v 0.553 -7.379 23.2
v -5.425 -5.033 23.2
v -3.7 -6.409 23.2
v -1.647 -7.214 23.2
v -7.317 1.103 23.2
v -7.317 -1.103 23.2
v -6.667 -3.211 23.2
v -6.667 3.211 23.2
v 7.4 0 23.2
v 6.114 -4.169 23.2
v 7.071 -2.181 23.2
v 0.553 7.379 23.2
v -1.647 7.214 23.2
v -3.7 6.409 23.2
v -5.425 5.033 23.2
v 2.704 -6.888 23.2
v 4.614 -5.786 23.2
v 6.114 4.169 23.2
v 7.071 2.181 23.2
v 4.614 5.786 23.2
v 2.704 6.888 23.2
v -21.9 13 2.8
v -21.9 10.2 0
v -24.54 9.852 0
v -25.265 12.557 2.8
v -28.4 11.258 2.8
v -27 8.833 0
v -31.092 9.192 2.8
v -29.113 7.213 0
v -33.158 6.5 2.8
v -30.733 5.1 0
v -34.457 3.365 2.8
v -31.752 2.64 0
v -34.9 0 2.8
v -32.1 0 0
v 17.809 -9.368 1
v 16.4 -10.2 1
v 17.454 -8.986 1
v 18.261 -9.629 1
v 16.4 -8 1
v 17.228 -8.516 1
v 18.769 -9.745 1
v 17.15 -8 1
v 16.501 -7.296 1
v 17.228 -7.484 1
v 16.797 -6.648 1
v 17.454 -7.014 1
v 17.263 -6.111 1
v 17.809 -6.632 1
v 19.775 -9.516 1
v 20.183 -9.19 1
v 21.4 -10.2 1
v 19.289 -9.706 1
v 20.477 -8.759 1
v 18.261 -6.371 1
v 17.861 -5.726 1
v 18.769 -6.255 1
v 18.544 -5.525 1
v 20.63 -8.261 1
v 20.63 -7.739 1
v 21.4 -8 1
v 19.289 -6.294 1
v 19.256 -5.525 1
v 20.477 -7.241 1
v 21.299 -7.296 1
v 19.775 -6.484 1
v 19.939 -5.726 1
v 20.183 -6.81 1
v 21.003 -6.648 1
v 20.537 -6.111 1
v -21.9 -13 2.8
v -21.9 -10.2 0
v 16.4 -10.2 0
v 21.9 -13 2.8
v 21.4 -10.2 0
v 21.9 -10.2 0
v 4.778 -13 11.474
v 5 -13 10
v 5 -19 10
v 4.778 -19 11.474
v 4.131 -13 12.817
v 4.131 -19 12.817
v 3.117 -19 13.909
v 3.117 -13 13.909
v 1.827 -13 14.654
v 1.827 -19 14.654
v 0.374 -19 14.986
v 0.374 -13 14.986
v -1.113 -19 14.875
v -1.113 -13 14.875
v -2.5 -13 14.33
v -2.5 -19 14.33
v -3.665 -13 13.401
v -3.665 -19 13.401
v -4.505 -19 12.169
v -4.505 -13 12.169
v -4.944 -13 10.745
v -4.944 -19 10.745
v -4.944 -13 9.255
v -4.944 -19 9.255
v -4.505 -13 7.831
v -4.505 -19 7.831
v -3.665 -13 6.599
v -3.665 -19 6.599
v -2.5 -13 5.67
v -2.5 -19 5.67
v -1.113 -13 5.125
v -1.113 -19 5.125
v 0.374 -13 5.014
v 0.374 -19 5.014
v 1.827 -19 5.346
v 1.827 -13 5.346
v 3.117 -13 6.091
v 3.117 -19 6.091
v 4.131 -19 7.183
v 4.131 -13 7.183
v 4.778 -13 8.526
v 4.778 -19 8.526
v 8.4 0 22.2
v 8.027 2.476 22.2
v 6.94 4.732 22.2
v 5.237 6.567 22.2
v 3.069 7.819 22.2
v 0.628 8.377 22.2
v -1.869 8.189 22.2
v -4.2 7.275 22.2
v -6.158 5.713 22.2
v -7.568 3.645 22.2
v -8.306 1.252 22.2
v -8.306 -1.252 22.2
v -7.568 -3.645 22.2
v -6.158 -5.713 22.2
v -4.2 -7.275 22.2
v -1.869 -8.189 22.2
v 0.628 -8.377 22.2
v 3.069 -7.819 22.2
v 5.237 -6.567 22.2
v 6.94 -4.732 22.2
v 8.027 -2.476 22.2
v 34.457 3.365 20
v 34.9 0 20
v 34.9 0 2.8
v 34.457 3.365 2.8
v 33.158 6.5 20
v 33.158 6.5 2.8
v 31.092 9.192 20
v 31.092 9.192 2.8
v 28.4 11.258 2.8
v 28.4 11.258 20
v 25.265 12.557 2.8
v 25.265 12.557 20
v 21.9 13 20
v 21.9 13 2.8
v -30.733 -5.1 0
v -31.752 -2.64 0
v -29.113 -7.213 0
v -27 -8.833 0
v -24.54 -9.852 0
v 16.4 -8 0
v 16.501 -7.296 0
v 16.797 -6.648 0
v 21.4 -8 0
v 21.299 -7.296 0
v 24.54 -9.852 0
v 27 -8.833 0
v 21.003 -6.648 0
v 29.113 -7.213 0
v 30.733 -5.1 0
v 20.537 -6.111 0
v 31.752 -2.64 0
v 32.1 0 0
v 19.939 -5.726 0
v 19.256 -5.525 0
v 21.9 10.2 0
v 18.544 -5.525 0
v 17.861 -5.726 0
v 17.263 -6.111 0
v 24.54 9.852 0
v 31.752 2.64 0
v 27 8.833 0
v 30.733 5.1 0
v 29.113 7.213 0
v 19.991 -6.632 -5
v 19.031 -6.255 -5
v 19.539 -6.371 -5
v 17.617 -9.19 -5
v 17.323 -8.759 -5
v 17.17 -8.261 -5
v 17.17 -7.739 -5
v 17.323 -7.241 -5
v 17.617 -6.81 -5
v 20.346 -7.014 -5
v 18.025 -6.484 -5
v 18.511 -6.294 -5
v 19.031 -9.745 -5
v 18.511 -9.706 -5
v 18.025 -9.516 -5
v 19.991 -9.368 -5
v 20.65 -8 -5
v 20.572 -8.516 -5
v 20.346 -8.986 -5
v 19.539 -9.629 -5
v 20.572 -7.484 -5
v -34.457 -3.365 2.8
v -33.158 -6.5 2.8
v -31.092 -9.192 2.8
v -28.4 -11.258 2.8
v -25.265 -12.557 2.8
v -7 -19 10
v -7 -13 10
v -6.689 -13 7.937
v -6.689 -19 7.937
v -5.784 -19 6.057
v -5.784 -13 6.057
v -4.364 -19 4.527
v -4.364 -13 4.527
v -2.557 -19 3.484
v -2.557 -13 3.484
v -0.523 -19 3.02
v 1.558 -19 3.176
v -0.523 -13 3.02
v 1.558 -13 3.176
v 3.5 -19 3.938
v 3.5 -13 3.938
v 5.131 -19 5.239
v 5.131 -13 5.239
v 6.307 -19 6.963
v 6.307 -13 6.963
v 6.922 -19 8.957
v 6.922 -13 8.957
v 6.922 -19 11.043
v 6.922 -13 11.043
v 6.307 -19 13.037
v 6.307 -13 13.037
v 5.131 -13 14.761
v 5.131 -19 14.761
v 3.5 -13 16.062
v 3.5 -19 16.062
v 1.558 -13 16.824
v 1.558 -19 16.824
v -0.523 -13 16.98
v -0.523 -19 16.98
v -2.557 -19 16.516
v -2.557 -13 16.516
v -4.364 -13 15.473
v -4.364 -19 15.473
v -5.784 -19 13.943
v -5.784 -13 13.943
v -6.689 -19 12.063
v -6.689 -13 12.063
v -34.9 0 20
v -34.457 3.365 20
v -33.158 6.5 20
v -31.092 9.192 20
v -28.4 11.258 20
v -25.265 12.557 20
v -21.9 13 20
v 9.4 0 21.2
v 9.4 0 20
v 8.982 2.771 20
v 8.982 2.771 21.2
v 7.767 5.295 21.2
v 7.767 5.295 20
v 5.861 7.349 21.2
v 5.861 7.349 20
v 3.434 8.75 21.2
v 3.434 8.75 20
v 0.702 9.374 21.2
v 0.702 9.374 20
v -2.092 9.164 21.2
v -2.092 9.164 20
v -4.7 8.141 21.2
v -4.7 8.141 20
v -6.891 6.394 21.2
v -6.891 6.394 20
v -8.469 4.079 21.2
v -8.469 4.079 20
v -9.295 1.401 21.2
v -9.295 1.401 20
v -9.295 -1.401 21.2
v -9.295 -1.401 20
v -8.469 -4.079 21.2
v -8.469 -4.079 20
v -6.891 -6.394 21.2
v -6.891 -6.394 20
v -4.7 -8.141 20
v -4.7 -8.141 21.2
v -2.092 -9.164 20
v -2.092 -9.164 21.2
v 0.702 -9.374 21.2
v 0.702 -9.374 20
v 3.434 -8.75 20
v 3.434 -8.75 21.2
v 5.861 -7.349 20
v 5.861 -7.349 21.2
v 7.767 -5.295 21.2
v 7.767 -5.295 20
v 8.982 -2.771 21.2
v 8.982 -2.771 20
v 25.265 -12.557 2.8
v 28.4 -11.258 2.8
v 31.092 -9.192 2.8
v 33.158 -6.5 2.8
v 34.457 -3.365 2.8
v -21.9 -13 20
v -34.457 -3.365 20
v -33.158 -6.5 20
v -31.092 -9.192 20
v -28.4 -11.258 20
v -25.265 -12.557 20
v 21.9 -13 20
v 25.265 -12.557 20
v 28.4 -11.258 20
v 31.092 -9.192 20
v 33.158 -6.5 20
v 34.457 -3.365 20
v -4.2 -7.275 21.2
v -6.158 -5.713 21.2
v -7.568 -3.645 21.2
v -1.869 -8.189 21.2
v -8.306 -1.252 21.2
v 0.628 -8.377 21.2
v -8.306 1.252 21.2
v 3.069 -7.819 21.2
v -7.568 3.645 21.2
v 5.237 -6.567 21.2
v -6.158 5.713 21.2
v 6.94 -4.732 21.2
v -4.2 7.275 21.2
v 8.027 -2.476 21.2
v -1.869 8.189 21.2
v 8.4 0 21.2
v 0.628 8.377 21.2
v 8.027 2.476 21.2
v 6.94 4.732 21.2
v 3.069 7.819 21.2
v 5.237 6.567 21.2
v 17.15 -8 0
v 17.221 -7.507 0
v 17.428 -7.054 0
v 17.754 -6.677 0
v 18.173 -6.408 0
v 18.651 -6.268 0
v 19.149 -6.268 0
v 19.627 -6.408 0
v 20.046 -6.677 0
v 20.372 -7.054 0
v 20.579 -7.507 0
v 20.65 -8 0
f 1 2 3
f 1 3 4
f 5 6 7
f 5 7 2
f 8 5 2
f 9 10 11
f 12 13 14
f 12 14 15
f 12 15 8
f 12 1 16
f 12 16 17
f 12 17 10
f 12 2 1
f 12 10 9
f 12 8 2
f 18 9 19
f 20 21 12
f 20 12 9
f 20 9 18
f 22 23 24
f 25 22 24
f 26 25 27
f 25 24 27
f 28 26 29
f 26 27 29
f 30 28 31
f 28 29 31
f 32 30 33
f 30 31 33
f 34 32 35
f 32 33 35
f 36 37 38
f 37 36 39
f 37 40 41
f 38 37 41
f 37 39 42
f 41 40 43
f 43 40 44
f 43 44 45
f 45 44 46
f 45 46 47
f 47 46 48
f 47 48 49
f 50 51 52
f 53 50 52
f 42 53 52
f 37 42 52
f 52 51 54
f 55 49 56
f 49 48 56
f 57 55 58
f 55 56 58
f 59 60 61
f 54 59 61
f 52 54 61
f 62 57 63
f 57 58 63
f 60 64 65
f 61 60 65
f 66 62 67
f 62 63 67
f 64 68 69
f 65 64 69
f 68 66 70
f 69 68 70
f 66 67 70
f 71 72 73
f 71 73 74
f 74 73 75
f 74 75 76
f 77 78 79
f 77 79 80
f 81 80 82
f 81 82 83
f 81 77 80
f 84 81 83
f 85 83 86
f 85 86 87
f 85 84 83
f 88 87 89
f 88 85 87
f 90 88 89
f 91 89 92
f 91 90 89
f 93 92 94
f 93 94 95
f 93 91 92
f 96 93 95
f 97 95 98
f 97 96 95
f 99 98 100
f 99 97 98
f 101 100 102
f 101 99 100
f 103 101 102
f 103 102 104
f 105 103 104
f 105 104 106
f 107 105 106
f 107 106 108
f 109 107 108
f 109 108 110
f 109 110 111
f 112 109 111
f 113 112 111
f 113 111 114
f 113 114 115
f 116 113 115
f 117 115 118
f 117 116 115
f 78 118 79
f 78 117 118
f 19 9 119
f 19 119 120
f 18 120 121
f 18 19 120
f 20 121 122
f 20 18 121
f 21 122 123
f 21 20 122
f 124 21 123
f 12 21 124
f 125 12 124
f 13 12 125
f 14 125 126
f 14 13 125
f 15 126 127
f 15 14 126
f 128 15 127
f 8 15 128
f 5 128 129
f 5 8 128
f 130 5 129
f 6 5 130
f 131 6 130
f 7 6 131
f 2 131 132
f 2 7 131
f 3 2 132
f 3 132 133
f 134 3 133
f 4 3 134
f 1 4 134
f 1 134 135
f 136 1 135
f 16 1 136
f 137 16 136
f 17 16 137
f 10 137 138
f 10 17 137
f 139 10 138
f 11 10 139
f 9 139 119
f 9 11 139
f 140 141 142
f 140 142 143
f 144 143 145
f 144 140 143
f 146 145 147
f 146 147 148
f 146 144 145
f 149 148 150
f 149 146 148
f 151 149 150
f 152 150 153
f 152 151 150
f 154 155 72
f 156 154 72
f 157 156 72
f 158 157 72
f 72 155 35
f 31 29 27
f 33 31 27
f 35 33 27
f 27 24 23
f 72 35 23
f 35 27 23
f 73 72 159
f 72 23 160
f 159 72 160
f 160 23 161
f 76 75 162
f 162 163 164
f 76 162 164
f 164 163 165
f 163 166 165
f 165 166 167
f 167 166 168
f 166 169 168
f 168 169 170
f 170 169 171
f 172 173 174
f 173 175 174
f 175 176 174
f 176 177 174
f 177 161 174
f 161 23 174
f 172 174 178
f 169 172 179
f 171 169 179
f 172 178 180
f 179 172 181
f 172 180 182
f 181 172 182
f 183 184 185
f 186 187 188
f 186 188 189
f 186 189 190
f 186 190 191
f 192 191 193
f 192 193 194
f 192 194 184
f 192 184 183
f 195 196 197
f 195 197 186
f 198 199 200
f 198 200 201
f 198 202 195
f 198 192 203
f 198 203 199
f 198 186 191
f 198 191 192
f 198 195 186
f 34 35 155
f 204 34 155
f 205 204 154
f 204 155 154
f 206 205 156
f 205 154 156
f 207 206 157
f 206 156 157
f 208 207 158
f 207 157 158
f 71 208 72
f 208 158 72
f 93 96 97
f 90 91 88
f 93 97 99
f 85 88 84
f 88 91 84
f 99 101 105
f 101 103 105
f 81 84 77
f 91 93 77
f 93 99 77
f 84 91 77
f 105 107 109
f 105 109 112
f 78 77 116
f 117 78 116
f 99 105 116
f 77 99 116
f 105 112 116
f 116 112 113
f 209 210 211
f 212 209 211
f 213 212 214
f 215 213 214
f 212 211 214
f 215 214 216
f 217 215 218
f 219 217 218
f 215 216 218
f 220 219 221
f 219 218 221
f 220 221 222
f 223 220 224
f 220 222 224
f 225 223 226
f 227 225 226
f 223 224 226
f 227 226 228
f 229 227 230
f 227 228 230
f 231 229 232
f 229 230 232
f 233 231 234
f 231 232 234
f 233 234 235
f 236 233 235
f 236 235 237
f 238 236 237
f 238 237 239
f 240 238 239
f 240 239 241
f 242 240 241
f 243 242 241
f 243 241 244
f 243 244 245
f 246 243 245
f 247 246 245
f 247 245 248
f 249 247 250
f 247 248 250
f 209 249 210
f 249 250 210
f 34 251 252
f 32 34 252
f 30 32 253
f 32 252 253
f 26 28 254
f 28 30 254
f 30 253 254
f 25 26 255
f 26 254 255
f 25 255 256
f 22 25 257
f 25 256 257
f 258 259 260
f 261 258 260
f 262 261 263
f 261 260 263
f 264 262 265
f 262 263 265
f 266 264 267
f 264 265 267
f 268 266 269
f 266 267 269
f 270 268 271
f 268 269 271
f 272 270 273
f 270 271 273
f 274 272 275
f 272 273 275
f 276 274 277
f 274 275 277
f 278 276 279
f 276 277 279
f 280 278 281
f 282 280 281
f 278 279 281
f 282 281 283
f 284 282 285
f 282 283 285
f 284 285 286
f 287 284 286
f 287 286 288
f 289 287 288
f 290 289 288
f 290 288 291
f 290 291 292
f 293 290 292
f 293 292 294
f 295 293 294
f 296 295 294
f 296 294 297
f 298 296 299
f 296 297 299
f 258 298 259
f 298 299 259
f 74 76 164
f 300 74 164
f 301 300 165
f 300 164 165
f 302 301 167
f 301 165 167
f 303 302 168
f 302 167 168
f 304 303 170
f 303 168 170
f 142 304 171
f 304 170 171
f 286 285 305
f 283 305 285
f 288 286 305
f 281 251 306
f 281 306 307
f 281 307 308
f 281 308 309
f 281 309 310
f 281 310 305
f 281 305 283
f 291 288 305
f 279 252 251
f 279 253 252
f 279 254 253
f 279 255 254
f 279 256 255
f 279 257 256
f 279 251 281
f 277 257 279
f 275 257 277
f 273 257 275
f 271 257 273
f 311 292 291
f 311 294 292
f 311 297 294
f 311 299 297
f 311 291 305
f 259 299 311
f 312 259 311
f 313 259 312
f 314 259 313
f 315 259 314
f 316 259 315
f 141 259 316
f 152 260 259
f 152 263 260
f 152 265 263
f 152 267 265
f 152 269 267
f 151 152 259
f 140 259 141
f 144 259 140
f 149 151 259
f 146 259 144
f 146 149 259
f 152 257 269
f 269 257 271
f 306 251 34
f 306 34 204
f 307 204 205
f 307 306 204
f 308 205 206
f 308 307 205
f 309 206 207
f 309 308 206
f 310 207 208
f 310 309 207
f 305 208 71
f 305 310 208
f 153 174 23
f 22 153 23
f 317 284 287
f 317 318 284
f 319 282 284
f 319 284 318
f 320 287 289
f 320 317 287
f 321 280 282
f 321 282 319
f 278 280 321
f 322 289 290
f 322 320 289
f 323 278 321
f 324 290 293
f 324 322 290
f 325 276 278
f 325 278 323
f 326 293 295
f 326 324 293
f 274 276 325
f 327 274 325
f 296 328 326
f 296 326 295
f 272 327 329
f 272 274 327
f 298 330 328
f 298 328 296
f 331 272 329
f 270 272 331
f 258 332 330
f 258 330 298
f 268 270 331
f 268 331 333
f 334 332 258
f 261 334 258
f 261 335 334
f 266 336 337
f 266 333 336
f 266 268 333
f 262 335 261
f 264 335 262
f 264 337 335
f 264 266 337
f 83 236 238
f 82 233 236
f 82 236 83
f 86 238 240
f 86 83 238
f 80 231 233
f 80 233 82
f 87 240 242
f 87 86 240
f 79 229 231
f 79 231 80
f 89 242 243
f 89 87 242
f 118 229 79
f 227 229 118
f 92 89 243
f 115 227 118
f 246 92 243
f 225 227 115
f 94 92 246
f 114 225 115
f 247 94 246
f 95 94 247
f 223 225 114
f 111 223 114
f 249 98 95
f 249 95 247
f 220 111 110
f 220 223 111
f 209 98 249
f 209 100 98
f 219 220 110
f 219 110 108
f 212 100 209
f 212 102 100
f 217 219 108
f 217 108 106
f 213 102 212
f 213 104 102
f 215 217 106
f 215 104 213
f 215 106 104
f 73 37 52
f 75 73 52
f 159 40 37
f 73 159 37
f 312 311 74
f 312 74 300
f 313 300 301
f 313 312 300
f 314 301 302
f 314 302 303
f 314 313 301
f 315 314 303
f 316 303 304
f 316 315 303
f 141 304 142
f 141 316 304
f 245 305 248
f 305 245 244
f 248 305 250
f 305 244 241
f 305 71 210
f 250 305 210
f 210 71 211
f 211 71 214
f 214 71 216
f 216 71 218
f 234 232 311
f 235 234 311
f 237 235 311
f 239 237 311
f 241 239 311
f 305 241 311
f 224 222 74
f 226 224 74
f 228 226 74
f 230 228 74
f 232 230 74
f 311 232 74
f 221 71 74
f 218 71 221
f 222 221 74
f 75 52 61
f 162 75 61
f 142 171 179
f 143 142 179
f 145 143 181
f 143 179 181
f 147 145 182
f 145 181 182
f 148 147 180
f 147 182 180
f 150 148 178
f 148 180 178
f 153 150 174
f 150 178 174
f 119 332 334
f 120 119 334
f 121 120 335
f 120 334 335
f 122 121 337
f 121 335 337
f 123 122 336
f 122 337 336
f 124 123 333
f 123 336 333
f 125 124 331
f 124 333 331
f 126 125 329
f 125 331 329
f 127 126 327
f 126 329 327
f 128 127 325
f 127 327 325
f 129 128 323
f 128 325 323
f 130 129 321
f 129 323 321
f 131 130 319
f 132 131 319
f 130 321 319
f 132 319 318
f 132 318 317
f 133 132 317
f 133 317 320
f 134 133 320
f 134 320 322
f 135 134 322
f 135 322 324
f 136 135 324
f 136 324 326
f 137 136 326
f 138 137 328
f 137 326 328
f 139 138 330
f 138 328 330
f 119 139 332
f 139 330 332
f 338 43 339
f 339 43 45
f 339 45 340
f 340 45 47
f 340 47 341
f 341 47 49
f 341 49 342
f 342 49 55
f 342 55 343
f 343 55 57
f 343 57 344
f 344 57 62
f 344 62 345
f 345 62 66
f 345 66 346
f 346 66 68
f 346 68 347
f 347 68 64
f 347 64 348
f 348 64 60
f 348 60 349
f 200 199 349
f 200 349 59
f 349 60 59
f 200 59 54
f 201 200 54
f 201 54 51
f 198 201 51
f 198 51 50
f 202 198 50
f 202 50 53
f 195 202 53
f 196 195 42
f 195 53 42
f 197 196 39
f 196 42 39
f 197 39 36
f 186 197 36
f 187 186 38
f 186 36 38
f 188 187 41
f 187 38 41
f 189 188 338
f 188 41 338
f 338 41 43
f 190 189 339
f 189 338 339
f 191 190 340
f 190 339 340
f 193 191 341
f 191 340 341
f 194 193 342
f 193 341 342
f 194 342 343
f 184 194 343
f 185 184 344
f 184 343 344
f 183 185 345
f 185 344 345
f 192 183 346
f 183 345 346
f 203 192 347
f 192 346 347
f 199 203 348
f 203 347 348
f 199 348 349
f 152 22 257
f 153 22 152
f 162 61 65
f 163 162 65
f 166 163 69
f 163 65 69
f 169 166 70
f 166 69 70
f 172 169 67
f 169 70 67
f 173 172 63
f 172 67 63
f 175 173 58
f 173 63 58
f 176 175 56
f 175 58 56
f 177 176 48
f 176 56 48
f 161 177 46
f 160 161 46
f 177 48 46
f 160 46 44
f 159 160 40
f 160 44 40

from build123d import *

# Parameters (mm, degrees)
SKETCH1_W           = 69.8
SKETCH1_H           = 26
BOSS_EXTRUDE1_DEPTH = 20
FILLET1_R           = 13
SKETCH2_R           = 9.4
BOSS_EXTRUDE2_DEPTH = 1.2
SKETCH3_R           = 8.4
BOSS_EXTRUDE3_DEPTH = 2
CHAMFER1_SIZE       = 1
SKETCH4_R           = 7
SKETCH4_R_2         = 5
BOSS_EXTRUDE4_DEPTH = 6
SKETCH5_R           = 1.75
BOSS_EXTRUDE5_DEPTH = 5
CHAMFER2_SIZE       = 2.8
CUT_EXTRUDE1_START  = -1
SKETCH6_R           = 1.75
CUT_EXTRUDE1_DEPTH  = 1


with BuildPart() as part:
    # Sketch1 → Boss-Extrude1 (new body)
    with BuildSketch(Plane.XY):
        Rectangle(SKETCH1_W, SKETCH1_H)
    extrude(amount=BOSS_EXTRUDE1_DEPTH)

    # Fillet1
    fillet1_edges = [part.edges().sort_by_distance(p)[0] for p in [
        (-34.9, -13, 10),
        (-34.9, 13, 10),
        (34.9, -13, 10),
        (34.9, 13, 10),
    ]]
    fillet(fillet1_edges, radius=FILLET1_R - 0.0001)  # a hair under: the kernel refuses the full size

    # Sketch2 → Boss-Extrude2 (add)
    with BuildSketch(Plane.XY.offset(20)):
        Circle(SKETCH2_R)
    extrude(amount=BOSS_EXTRUDE2_DEPTH)

    # Sketch3 → Boss-Extrude3 (add)
    with BuildSketch(Plane.XY.offset(21.2)):
        Circle(SKETCH3_R)
    extrude(amount=BOSS_EXTRUDE3_DEPTH)

    # Chamfer1
    chamfer1_edges = [part.edges().sort_by_distance(p)[0] for p in [
        (-8.4, 0, 23.2),
    ]]
    chamfer(chamfer1_edges, length=CHAMFER1_SIZE)

    # Sketch4 → Boss-Extrude4 (add)
    with BuildSketch(Plane.XZ.offset(13)):
        with Locations(Location((0, 10, 0), (0, 0, 180))):
            Circle(SKETCH4_R)
        with Locations((0, 10)):
            Circle(SKETCH4_R_2, mode=Mode.SUBTRACT)
    extrude(amount=BOSS_EXTRUDE4_DEPTH)

    # Sketch5 → Boss-Extrude5 (add)
    with BuildSketch(Plane(origin=(0, 0, 0), x_dir=(-1, 0, 0), z_dir=(0, 0, -1))):
        with Locations(Location((-18.9, -8, 0), (0, 0, 180))):
            Circle(SKETCH5_R)
    extrude(amount=BOSS_EXTRUDE5_DEPTH)

    # Chamfer2
    chamfer2_edges = [part.edges().sort_by_distance(p)[0] for p in [
        (0, -13, 0),
        (0, 13, 0),
        (31.092417445, 9.192417445, 0),
        (31.092417445, -9.192417445, 0),
        (-31.092417445, 9.192417445, 0),
        (-31.092417445, -9.192417445, 0),
    ]]
    chamfer(chamfer2_edges, length=CHAMFER2_SIZE)

    # Sketch6 → Cut-Extrude1 (cut)
    with BuildSketch(Plane(origin=(0, 0, 0), x_dir=(-1, 0, 0), z_dir=(0, 0, -1)).offset(CUT_EXTRUDE1_START)):
        with BuildLine():
            Line((-21.4, -10.2), (-21.4, -8))
            ThreePointArc((-21.4, -8), (-18.9, -5.5), (-16.4, -8))
            Line((-16.4, -8), (-16.4, -10.2))
            Line((-16.4, -10.2), (-21.4, -10.2))
        make_face()
        with Locations((-18.9, -8)):
            Circle(SKETCH6_R, mode=Mode.SUBTRACT)
    extrude(amount=CUT_EXTRUDE1_DEPTH, mode=Mode.SUBTRACT)


solid = part.part
